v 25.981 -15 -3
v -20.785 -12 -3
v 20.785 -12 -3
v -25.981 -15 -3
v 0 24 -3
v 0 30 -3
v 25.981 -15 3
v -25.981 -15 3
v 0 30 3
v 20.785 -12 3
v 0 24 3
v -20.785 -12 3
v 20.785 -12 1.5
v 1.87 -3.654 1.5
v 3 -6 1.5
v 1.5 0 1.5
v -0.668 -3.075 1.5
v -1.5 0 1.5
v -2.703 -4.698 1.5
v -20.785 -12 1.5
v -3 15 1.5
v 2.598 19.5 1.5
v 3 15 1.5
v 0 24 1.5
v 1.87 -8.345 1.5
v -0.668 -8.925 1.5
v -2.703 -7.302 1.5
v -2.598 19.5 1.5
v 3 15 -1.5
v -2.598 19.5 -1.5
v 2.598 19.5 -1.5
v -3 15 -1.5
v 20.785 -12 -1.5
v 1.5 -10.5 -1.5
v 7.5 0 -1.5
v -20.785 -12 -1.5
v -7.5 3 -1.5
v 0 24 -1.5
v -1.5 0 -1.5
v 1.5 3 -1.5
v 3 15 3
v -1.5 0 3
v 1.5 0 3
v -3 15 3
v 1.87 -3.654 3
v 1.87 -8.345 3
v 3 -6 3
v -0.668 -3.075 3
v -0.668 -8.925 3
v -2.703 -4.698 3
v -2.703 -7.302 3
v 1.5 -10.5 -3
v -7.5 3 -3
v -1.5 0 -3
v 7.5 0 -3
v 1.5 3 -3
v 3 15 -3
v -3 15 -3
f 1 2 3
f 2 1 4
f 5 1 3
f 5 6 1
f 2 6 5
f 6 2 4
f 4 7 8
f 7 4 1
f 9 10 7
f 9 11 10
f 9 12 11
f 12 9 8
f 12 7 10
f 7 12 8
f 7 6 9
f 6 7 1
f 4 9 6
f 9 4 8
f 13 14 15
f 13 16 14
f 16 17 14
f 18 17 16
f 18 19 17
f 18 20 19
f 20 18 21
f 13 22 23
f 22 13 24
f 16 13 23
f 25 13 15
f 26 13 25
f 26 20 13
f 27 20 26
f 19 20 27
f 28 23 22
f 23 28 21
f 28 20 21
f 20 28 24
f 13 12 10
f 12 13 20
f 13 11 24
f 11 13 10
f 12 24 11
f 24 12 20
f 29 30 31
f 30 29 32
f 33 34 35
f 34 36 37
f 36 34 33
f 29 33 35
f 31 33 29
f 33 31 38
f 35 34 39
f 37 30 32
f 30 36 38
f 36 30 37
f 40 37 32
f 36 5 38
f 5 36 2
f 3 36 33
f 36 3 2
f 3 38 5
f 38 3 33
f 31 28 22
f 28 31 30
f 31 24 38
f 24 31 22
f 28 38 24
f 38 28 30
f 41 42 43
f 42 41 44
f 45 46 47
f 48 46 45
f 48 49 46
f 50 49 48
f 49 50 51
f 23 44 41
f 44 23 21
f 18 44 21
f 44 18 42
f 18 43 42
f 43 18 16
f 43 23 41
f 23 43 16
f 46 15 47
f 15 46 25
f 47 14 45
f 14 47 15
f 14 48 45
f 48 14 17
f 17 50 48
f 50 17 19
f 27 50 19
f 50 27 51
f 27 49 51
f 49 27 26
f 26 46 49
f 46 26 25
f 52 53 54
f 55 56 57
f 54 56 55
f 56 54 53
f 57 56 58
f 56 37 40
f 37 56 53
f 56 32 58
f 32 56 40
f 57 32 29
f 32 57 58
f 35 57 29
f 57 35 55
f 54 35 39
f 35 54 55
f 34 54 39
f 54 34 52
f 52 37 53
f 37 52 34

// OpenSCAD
r = 20;
module triangle(l, r){
    linear_extrude(l){
        polygon([
            [cos(90)*r, sin(90)*r],
            [cos(210)*r, sin(210)*r],
            [cos(330)*r, sin(330)*r]
        ]);
    }
}

scale([1.5, 1.5, 1.5])
union(){
    difference(){
        translate([0, 0, -2])
        triangle(4, r);
        
        translate([0, 0, 1])
        triangle(1, r-4);
        rotate([0, 180, 0])
        translate([0, 0, 1])
        triangle(1, r-4);
        
        translate([0, 0, -2])
        translate([0,r-6,0])
        triangle(4, 2);
    }


    translate([0, 0, 1])
    linear_extrude(1){
        translate([0, -1/5*r, 0])
        circle(2);
        
        polygon(
            [
            [-1, 0],
            [1, 0],
            [2, 10],
            [-2, 10]
        ]
        );
    }

    rotate([0, 180, 0])
    translate([0, 0, 1])
    linear_extrude(1){
        
        polygon(
            [
            [-2, 10],
            [2, 10],
            [-1, 2],
            [5,  2],
            [-1, -7],
            [1, 0],
            [-5,0]
        ]
        );
    }
}
